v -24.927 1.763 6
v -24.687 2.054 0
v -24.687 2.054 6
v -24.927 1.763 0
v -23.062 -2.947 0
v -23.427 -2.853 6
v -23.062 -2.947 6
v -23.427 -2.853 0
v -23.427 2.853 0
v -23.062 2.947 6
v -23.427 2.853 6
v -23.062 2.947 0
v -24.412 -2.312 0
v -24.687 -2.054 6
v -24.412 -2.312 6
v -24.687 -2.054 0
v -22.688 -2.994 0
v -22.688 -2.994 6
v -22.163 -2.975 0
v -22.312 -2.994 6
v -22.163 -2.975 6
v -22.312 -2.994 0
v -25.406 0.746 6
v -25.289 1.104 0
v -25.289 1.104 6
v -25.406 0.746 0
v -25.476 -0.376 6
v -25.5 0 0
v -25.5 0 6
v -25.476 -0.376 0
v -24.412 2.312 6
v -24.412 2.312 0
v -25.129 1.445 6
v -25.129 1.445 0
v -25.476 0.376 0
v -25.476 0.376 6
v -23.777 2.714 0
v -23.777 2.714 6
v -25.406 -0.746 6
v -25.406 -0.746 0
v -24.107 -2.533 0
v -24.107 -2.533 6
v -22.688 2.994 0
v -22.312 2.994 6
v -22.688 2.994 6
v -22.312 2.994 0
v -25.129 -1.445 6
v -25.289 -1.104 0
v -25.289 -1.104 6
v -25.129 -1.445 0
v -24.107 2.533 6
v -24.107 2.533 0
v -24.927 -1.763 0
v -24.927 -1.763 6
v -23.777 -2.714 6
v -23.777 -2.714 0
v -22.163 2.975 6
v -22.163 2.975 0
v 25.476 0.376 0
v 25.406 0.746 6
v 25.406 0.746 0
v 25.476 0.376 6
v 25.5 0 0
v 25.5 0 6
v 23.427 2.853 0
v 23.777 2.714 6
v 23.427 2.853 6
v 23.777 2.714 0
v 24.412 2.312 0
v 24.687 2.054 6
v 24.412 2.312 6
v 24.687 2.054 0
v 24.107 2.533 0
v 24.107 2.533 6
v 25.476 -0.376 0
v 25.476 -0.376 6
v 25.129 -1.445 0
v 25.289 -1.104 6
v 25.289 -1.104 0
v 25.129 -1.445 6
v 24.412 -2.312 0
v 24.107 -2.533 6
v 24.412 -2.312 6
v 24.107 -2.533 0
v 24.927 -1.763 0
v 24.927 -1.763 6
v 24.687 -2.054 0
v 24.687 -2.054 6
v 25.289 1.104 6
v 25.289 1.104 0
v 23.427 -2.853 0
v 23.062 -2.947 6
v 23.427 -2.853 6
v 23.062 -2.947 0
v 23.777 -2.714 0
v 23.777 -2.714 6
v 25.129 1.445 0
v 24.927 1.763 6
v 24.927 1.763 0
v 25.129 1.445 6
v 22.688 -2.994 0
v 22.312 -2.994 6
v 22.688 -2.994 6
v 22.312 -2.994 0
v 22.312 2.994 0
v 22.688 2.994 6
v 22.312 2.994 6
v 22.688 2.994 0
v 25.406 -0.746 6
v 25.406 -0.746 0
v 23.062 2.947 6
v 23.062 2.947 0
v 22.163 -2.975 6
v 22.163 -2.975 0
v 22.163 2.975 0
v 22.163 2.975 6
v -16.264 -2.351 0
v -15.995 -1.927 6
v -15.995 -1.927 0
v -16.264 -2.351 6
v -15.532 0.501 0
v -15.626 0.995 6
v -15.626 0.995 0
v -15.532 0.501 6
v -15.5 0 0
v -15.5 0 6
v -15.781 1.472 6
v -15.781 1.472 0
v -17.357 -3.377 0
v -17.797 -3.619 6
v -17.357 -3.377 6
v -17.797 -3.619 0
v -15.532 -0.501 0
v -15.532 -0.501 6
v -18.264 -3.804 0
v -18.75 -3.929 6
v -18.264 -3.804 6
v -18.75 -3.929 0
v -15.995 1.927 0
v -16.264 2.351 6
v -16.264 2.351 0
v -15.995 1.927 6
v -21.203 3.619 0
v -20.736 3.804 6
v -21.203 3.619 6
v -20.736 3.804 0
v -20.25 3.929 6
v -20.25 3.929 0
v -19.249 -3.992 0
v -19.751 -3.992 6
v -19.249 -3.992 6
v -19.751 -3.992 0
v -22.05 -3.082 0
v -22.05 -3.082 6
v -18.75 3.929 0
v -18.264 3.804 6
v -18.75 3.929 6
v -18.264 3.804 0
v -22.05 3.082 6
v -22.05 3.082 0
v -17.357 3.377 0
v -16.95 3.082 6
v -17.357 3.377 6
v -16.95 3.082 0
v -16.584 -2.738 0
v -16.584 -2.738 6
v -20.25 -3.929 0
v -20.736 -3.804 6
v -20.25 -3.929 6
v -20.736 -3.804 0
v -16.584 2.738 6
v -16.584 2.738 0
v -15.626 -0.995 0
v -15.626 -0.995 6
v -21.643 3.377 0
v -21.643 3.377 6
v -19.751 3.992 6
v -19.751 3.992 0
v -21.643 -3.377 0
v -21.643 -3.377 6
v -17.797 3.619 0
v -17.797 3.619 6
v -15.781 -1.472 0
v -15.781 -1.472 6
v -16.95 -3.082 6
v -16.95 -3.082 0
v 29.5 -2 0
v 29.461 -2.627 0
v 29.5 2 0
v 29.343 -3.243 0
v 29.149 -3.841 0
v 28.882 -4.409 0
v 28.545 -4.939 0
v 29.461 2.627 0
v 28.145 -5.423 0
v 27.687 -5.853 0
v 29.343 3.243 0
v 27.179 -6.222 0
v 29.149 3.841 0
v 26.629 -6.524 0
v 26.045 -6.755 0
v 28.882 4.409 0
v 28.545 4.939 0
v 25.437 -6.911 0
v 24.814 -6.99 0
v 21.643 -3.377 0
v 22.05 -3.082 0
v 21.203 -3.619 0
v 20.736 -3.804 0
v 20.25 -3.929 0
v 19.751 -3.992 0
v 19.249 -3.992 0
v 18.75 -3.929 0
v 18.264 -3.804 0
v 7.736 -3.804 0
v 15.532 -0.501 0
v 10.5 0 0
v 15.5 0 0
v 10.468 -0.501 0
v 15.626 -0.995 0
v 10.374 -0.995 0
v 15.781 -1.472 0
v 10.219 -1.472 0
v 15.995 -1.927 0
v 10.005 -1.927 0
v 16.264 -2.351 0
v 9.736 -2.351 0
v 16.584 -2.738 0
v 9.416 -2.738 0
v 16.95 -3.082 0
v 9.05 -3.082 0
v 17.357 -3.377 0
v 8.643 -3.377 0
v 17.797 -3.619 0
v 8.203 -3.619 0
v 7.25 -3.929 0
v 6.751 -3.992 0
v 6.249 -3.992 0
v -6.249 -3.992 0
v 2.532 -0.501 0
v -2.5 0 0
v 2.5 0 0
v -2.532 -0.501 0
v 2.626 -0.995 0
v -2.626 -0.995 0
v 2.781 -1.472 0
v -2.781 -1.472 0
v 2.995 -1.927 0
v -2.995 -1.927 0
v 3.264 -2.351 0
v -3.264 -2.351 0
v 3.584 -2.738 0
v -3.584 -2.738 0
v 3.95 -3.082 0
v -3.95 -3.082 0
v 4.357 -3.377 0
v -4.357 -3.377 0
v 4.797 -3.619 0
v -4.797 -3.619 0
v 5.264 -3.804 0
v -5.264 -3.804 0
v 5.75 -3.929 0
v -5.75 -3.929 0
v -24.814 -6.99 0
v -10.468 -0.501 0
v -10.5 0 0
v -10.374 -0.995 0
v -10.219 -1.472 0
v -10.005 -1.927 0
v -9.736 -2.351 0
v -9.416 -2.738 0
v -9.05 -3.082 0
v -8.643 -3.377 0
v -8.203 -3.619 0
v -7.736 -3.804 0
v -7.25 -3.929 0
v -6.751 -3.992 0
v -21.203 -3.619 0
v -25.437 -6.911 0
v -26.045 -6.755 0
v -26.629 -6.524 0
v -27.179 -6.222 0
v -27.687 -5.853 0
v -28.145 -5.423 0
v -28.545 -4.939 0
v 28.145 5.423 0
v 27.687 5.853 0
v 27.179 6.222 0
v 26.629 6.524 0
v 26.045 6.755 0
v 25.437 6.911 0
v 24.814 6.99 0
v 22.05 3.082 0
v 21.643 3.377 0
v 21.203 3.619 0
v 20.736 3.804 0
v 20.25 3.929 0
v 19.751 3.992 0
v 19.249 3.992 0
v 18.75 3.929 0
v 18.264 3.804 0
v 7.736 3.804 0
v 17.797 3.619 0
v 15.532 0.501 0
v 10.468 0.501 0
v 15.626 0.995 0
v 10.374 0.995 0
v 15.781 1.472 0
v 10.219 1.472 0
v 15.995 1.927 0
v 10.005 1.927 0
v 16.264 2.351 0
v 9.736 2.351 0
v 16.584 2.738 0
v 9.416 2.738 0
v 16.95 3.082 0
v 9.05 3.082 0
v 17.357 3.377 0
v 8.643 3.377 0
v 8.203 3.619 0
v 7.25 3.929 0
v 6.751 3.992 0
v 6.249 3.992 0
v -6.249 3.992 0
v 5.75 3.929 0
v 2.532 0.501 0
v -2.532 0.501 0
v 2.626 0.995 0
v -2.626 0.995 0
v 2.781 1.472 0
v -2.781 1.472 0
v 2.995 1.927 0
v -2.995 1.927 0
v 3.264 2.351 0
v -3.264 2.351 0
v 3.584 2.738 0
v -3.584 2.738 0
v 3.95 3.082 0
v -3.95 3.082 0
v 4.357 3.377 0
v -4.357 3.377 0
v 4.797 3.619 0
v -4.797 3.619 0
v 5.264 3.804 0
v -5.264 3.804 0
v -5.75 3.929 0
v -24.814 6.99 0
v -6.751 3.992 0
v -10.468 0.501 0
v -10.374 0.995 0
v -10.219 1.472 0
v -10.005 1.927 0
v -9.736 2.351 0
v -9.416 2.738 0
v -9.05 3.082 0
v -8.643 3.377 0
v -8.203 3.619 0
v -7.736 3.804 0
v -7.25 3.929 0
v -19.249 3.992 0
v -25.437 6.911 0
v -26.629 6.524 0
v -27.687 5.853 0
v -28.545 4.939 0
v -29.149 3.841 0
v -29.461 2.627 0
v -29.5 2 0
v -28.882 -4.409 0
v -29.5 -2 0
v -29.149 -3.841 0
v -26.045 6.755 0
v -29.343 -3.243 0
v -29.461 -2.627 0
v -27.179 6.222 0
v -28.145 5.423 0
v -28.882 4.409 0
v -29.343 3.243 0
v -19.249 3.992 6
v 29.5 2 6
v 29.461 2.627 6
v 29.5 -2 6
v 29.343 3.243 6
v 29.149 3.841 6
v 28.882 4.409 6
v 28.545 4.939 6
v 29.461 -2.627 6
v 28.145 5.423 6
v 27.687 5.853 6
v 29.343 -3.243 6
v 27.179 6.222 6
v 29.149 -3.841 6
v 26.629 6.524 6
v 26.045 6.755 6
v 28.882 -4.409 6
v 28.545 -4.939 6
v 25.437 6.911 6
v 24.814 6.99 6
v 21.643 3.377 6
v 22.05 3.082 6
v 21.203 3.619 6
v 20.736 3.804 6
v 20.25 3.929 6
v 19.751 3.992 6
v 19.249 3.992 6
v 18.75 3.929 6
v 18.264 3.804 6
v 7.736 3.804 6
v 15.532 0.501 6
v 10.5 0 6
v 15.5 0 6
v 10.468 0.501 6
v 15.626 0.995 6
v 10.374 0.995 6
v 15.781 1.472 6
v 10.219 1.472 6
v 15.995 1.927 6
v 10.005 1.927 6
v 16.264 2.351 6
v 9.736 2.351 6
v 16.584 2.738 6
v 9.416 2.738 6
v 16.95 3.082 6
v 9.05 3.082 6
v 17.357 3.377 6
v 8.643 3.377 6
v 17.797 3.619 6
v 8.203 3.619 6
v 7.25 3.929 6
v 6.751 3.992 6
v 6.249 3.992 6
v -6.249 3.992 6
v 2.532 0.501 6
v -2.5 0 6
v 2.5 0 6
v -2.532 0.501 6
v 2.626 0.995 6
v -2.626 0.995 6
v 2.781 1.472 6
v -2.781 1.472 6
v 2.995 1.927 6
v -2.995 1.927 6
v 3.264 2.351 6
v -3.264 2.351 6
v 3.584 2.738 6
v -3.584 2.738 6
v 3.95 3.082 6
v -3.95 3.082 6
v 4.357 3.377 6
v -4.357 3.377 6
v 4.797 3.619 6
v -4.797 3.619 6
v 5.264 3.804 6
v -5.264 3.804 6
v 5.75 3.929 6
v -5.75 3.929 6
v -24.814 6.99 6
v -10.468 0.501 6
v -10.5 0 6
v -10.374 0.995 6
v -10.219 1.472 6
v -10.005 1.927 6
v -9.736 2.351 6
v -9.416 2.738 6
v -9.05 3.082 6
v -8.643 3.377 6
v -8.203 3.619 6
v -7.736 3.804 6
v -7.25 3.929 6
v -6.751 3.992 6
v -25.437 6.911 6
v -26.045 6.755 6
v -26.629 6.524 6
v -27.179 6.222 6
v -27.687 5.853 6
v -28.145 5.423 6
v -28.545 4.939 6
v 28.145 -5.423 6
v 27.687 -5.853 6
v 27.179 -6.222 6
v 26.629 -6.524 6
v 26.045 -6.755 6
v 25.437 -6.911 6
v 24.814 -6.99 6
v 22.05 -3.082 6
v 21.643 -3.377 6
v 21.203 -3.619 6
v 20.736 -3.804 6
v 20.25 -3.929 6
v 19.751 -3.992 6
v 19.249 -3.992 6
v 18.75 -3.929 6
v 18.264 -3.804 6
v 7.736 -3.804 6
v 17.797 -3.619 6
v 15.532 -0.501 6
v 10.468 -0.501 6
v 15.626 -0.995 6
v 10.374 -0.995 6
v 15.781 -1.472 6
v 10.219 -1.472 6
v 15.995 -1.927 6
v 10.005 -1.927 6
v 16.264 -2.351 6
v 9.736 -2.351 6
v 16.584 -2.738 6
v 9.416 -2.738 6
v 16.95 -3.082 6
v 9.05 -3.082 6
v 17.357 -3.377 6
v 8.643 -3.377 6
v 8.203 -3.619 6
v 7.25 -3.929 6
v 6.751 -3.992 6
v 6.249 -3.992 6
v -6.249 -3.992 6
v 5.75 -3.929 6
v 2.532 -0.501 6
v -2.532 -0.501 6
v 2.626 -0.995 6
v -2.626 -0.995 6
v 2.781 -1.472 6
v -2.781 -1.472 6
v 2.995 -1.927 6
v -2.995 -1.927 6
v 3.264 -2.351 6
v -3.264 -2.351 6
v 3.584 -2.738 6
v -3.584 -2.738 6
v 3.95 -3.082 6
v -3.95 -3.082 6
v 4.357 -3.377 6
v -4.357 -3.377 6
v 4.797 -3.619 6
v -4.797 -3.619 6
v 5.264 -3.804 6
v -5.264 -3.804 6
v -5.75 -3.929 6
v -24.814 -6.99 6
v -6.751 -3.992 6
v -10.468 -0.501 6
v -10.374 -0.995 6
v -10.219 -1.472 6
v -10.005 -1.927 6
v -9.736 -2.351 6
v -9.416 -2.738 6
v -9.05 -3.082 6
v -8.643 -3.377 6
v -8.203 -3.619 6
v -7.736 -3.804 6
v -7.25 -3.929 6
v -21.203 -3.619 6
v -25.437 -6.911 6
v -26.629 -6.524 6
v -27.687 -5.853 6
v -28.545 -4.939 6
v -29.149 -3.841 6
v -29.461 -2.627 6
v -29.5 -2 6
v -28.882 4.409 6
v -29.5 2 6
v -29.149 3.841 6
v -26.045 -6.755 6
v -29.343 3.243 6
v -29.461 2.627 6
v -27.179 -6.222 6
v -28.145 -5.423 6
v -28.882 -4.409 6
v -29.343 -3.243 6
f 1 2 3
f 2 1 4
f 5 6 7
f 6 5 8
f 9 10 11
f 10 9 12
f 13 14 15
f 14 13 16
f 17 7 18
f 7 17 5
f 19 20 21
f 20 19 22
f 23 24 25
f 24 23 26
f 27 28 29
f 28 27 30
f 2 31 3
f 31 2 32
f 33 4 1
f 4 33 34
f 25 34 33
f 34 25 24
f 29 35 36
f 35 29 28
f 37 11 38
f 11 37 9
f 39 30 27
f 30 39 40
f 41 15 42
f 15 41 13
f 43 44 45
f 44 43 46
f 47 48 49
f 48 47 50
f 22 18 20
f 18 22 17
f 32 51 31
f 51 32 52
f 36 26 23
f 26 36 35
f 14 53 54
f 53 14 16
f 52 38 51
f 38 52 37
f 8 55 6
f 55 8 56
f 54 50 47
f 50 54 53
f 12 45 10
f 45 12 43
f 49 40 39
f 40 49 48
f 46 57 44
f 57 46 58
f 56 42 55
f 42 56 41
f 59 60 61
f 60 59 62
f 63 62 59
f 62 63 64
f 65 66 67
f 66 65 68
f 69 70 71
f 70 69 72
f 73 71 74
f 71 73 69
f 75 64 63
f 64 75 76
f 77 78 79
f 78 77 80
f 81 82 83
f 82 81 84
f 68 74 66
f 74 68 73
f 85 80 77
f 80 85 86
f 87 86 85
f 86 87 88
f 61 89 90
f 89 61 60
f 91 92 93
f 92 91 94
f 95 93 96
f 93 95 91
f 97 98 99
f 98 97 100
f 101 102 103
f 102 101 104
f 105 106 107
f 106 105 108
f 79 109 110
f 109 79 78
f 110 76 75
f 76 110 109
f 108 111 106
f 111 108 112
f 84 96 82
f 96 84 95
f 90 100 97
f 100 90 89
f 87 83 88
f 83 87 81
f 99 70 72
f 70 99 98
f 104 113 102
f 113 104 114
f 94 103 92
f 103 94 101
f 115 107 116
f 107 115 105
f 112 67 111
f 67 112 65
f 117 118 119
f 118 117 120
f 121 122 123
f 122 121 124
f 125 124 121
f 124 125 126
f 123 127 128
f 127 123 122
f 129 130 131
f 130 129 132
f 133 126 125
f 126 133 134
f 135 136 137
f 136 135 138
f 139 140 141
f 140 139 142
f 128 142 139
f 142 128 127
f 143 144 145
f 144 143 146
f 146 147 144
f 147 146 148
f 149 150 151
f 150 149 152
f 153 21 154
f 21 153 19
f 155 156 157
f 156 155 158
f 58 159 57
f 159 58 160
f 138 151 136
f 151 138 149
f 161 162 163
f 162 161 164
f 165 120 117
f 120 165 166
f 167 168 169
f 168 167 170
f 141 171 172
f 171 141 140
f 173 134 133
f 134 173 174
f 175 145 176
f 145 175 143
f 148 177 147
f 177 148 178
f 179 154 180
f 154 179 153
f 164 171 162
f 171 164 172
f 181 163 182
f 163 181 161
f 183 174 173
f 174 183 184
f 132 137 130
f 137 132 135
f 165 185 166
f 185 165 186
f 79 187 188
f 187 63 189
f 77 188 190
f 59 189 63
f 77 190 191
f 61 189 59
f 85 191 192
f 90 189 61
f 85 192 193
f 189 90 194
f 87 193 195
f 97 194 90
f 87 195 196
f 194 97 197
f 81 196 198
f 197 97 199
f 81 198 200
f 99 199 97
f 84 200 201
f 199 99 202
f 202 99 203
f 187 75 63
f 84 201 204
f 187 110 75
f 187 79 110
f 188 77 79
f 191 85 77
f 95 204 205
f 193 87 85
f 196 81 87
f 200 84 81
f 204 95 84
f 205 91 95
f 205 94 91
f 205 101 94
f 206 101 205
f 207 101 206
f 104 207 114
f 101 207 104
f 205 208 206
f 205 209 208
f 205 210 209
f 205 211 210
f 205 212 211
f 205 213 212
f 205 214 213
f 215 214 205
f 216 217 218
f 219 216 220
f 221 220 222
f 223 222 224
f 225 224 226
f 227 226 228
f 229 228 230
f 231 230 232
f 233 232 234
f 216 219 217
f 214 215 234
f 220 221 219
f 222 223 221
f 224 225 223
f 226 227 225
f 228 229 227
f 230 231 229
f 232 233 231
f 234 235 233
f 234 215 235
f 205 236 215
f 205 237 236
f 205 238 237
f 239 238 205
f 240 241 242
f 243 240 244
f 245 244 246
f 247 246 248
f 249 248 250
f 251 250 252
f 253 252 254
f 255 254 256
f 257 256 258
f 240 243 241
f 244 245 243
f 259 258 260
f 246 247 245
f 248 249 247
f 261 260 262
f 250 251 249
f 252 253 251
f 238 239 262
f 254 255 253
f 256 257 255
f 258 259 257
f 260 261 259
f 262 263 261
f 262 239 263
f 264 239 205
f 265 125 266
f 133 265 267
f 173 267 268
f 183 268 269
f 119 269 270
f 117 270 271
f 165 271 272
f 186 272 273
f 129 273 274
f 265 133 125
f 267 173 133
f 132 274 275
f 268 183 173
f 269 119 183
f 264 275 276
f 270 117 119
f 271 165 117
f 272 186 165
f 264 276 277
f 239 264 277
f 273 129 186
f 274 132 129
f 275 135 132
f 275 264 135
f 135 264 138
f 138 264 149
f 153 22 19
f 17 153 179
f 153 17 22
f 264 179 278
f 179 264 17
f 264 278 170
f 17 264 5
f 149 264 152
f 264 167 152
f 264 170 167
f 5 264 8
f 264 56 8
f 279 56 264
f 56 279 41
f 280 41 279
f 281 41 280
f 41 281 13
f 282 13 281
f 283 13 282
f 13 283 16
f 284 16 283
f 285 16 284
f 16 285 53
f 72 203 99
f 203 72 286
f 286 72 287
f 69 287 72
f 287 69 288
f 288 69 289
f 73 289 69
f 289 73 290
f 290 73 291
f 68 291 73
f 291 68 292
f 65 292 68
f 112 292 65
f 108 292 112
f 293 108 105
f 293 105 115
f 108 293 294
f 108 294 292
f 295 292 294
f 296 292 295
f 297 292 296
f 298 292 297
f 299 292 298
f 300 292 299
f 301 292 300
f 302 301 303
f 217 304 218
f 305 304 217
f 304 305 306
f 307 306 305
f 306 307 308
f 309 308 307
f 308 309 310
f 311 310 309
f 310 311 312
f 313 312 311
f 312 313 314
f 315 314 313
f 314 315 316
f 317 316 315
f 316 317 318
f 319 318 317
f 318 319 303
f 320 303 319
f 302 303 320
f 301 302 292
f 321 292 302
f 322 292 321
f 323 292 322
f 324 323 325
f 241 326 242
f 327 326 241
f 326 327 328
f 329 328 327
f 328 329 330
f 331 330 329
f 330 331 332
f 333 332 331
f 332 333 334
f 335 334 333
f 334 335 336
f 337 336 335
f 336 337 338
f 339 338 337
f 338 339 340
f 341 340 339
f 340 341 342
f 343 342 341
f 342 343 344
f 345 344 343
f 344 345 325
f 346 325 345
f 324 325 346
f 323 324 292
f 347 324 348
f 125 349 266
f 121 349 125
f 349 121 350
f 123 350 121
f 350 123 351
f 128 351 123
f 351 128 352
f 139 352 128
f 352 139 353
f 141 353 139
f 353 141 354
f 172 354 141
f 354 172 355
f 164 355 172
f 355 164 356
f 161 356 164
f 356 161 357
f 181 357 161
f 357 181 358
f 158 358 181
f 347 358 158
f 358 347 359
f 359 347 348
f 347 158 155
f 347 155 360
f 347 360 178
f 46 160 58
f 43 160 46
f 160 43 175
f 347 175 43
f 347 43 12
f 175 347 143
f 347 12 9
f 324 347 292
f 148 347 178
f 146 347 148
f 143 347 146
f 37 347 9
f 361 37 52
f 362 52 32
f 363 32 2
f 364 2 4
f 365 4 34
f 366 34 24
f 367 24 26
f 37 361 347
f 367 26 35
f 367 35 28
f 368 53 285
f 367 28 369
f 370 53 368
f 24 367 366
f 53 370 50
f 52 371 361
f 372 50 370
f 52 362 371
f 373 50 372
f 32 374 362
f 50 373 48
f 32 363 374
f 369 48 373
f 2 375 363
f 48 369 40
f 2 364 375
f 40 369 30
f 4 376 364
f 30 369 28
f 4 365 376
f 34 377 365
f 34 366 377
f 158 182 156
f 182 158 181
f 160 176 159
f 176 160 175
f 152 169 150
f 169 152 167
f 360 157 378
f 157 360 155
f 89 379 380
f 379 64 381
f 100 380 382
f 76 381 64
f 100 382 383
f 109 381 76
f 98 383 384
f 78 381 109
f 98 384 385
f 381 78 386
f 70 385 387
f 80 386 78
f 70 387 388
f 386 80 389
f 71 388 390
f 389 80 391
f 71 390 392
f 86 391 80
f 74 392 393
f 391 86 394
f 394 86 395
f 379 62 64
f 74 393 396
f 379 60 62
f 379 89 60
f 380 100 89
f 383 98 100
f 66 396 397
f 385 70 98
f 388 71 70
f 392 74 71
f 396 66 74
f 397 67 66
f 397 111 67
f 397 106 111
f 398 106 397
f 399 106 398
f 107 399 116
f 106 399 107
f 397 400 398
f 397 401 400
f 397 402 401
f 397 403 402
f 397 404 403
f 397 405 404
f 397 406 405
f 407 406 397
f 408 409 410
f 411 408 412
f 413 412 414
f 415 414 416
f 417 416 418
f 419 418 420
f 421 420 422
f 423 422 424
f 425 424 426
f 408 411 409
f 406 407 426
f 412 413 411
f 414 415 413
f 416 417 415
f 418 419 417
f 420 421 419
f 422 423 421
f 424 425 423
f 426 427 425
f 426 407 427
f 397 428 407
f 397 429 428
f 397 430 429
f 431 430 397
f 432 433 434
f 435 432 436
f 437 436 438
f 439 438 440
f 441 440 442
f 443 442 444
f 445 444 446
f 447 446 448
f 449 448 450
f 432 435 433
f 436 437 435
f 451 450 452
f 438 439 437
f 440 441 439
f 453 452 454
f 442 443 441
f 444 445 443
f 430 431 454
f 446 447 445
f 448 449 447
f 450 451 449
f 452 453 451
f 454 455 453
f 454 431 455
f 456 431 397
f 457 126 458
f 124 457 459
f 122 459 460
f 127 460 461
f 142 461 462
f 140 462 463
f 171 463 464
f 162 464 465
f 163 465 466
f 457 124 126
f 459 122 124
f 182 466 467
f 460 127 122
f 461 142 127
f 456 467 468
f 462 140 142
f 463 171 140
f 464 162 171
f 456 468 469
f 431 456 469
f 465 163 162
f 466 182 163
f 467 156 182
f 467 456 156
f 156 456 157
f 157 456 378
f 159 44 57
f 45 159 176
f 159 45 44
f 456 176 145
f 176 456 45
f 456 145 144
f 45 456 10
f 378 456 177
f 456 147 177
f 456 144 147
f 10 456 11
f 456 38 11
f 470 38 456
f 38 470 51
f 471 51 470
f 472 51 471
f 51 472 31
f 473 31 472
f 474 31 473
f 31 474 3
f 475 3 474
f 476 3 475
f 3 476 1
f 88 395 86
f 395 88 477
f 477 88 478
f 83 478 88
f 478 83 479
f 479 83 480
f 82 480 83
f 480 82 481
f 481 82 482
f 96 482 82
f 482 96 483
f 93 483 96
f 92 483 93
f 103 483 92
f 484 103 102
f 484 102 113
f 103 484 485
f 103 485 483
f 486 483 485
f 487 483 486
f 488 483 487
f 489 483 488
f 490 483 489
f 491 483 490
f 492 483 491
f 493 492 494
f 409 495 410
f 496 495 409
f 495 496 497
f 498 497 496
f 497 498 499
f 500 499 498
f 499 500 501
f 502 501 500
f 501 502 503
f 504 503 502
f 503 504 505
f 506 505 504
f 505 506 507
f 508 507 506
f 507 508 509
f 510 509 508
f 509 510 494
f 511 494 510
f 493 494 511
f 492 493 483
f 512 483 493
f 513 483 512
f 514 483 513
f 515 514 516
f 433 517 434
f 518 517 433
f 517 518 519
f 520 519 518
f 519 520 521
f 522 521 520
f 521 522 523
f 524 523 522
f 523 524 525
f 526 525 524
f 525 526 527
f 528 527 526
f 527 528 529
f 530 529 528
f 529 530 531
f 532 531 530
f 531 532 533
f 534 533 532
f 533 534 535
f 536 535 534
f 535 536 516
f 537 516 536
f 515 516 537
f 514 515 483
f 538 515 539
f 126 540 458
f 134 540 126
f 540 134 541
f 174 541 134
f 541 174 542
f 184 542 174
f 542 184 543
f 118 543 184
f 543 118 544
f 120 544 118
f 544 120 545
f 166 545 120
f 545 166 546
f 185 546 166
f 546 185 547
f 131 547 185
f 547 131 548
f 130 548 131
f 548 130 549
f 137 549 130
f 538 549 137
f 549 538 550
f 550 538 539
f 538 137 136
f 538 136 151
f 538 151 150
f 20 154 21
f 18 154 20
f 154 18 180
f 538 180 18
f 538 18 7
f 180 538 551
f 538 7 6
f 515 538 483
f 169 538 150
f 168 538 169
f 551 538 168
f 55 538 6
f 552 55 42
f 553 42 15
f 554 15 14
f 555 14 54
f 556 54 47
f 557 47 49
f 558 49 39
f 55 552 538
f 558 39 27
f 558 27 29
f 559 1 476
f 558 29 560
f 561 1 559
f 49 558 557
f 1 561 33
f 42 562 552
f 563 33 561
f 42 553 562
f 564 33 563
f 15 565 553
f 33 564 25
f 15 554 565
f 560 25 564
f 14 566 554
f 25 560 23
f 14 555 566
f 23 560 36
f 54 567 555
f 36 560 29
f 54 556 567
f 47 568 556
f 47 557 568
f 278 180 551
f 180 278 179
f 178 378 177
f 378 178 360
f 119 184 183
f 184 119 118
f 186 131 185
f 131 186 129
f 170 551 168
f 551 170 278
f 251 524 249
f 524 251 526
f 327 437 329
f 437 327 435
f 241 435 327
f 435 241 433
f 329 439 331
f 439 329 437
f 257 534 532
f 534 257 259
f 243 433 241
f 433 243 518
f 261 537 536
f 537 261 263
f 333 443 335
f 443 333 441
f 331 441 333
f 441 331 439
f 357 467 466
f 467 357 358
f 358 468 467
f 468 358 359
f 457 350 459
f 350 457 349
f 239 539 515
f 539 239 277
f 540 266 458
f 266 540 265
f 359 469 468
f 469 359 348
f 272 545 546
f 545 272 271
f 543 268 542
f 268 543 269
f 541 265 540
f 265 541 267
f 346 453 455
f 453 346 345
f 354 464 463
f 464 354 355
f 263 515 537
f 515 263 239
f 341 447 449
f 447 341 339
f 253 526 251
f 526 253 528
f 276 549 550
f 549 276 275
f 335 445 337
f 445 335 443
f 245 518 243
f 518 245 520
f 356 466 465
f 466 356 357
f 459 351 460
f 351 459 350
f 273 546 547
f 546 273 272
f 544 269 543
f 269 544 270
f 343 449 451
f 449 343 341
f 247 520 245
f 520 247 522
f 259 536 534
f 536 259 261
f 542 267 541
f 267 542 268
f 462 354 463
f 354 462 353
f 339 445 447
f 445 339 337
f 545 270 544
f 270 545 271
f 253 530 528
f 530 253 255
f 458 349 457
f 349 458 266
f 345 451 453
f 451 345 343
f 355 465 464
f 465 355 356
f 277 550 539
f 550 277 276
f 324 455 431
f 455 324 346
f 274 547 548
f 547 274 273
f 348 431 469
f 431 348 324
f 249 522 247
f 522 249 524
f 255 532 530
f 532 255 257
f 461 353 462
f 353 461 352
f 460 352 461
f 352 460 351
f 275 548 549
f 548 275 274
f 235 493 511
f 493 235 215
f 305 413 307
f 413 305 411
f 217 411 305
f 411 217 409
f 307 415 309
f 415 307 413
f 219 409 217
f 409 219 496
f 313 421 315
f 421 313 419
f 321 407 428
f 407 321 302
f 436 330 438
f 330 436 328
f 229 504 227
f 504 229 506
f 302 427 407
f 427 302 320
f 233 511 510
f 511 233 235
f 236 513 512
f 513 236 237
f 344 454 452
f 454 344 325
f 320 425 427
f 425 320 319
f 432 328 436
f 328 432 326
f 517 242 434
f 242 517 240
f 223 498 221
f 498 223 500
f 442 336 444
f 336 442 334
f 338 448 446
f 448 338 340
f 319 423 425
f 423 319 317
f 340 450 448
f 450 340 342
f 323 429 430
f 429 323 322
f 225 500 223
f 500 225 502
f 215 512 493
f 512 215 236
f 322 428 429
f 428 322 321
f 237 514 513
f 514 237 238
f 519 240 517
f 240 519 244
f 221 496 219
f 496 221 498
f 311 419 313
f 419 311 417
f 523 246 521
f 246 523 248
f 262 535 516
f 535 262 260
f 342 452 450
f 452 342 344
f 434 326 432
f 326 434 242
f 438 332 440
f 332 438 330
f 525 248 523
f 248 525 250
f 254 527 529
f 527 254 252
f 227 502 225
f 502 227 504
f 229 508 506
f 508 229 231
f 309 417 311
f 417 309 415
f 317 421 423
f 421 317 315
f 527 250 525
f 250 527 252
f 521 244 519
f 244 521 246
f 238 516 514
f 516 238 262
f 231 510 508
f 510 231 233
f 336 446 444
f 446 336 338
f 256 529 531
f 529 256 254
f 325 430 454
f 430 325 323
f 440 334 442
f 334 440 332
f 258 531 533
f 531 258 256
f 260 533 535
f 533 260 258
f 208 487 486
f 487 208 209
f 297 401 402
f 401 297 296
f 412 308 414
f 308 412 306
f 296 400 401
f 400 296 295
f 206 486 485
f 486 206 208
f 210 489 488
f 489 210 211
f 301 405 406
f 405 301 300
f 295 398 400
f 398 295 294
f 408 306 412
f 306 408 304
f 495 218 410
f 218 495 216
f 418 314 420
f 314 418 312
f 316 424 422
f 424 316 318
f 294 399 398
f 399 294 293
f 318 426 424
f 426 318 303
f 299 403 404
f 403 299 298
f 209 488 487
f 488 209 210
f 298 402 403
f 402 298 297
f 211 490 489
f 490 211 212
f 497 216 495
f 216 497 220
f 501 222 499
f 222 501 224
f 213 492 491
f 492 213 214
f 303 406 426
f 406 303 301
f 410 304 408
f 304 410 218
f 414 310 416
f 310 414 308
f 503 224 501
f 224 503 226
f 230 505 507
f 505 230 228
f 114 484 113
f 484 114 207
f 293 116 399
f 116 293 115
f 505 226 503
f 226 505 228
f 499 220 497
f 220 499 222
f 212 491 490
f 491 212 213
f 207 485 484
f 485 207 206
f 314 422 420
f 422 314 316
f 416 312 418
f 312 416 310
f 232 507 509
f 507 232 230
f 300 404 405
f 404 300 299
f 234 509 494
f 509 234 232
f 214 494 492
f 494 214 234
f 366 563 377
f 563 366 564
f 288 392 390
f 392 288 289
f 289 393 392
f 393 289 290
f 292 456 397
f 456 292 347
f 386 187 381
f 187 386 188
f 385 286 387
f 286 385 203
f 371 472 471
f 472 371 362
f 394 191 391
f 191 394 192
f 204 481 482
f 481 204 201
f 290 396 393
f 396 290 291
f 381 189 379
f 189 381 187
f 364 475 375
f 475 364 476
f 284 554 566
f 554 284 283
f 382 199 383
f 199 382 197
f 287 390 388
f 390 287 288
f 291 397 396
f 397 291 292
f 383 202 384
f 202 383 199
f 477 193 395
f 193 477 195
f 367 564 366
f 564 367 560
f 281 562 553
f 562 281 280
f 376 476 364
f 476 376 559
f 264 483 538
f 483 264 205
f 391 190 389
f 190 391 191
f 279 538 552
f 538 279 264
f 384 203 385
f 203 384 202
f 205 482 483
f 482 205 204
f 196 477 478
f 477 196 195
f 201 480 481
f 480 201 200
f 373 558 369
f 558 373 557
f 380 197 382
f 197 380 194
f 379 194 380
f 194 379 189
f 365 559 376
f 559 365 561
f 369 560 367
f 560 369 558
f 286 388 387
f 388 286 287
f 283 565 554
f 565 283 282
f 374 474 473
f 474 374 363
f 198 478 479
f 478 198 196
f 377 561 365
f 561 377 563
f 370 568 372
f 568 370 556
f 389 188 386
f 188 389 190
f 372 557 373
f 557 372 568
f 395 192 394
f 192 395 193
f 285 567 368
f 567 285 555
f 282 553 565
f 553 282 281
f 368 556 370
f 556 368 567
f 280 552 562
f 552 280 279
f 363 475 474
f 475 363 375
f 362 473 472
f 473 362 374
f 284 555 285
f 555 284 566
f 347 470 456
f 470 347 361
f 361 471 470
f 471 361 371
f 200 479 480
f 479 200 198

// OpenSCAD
$fn = 50;


difference() {
	union() {
		hull() {
			translate(v = [-24.5000000000, 2.0000000000, 0]) {
				cylinder(h = 6, r = 5);
			}
			translate(v = [24.5000000000, 2.0000000000, 0]) {
				cylinder(h = 6, r = 5);
			}
			translate(v = [-24.5000000000, -2.0000000000, 0]) {
				cylinder(h = 6, r = 5);
			}
			translate(v = [24.5000000000, -2.0000000000, 0]) {
				cylinder(h = 6, r = 5);
			}
		}
	}
	union() {
		#translate(v = [-22.5000000000, 0.0000000000, -100.0000000000]) {
			cylinder(h = 200, r = 3.0000000000);
		}
		#translate(v = [-22.5000000000, 0.0000000000, -100.0000000000]) {
			cylinder(h = 200, r = 3.0000000000);
		}
		#translate(v = [22.5000000000, 0.0000000000, -100.0000000000]) {
			cylinder(h = 200, r = 3.0000000000);
		}
		#translate(v = [22.5000000000, 0.0000000000, -100.0000000000]) {
			cylinder(h = 200, r = 3.0000000000);
		}
		#translate(v = [-19.5000000000, 0, 0]) {
			cylinder(h = 6, r = 4.0000000000);
		}
		#translate(v = [-6.5000000000, 0, 0]) {
			cylinder(h = 6, r = 4.0000000000);
		}
		#translate(v = [6.5000000000, 0, 0]) {
			cylinder(h = 6, r = 4.0000000000);
		}
		#translate(v = [19.5000000000, 0, 0]) {
			cylinder(h = 6, r = 4.0000000000);
		}
	}
}
